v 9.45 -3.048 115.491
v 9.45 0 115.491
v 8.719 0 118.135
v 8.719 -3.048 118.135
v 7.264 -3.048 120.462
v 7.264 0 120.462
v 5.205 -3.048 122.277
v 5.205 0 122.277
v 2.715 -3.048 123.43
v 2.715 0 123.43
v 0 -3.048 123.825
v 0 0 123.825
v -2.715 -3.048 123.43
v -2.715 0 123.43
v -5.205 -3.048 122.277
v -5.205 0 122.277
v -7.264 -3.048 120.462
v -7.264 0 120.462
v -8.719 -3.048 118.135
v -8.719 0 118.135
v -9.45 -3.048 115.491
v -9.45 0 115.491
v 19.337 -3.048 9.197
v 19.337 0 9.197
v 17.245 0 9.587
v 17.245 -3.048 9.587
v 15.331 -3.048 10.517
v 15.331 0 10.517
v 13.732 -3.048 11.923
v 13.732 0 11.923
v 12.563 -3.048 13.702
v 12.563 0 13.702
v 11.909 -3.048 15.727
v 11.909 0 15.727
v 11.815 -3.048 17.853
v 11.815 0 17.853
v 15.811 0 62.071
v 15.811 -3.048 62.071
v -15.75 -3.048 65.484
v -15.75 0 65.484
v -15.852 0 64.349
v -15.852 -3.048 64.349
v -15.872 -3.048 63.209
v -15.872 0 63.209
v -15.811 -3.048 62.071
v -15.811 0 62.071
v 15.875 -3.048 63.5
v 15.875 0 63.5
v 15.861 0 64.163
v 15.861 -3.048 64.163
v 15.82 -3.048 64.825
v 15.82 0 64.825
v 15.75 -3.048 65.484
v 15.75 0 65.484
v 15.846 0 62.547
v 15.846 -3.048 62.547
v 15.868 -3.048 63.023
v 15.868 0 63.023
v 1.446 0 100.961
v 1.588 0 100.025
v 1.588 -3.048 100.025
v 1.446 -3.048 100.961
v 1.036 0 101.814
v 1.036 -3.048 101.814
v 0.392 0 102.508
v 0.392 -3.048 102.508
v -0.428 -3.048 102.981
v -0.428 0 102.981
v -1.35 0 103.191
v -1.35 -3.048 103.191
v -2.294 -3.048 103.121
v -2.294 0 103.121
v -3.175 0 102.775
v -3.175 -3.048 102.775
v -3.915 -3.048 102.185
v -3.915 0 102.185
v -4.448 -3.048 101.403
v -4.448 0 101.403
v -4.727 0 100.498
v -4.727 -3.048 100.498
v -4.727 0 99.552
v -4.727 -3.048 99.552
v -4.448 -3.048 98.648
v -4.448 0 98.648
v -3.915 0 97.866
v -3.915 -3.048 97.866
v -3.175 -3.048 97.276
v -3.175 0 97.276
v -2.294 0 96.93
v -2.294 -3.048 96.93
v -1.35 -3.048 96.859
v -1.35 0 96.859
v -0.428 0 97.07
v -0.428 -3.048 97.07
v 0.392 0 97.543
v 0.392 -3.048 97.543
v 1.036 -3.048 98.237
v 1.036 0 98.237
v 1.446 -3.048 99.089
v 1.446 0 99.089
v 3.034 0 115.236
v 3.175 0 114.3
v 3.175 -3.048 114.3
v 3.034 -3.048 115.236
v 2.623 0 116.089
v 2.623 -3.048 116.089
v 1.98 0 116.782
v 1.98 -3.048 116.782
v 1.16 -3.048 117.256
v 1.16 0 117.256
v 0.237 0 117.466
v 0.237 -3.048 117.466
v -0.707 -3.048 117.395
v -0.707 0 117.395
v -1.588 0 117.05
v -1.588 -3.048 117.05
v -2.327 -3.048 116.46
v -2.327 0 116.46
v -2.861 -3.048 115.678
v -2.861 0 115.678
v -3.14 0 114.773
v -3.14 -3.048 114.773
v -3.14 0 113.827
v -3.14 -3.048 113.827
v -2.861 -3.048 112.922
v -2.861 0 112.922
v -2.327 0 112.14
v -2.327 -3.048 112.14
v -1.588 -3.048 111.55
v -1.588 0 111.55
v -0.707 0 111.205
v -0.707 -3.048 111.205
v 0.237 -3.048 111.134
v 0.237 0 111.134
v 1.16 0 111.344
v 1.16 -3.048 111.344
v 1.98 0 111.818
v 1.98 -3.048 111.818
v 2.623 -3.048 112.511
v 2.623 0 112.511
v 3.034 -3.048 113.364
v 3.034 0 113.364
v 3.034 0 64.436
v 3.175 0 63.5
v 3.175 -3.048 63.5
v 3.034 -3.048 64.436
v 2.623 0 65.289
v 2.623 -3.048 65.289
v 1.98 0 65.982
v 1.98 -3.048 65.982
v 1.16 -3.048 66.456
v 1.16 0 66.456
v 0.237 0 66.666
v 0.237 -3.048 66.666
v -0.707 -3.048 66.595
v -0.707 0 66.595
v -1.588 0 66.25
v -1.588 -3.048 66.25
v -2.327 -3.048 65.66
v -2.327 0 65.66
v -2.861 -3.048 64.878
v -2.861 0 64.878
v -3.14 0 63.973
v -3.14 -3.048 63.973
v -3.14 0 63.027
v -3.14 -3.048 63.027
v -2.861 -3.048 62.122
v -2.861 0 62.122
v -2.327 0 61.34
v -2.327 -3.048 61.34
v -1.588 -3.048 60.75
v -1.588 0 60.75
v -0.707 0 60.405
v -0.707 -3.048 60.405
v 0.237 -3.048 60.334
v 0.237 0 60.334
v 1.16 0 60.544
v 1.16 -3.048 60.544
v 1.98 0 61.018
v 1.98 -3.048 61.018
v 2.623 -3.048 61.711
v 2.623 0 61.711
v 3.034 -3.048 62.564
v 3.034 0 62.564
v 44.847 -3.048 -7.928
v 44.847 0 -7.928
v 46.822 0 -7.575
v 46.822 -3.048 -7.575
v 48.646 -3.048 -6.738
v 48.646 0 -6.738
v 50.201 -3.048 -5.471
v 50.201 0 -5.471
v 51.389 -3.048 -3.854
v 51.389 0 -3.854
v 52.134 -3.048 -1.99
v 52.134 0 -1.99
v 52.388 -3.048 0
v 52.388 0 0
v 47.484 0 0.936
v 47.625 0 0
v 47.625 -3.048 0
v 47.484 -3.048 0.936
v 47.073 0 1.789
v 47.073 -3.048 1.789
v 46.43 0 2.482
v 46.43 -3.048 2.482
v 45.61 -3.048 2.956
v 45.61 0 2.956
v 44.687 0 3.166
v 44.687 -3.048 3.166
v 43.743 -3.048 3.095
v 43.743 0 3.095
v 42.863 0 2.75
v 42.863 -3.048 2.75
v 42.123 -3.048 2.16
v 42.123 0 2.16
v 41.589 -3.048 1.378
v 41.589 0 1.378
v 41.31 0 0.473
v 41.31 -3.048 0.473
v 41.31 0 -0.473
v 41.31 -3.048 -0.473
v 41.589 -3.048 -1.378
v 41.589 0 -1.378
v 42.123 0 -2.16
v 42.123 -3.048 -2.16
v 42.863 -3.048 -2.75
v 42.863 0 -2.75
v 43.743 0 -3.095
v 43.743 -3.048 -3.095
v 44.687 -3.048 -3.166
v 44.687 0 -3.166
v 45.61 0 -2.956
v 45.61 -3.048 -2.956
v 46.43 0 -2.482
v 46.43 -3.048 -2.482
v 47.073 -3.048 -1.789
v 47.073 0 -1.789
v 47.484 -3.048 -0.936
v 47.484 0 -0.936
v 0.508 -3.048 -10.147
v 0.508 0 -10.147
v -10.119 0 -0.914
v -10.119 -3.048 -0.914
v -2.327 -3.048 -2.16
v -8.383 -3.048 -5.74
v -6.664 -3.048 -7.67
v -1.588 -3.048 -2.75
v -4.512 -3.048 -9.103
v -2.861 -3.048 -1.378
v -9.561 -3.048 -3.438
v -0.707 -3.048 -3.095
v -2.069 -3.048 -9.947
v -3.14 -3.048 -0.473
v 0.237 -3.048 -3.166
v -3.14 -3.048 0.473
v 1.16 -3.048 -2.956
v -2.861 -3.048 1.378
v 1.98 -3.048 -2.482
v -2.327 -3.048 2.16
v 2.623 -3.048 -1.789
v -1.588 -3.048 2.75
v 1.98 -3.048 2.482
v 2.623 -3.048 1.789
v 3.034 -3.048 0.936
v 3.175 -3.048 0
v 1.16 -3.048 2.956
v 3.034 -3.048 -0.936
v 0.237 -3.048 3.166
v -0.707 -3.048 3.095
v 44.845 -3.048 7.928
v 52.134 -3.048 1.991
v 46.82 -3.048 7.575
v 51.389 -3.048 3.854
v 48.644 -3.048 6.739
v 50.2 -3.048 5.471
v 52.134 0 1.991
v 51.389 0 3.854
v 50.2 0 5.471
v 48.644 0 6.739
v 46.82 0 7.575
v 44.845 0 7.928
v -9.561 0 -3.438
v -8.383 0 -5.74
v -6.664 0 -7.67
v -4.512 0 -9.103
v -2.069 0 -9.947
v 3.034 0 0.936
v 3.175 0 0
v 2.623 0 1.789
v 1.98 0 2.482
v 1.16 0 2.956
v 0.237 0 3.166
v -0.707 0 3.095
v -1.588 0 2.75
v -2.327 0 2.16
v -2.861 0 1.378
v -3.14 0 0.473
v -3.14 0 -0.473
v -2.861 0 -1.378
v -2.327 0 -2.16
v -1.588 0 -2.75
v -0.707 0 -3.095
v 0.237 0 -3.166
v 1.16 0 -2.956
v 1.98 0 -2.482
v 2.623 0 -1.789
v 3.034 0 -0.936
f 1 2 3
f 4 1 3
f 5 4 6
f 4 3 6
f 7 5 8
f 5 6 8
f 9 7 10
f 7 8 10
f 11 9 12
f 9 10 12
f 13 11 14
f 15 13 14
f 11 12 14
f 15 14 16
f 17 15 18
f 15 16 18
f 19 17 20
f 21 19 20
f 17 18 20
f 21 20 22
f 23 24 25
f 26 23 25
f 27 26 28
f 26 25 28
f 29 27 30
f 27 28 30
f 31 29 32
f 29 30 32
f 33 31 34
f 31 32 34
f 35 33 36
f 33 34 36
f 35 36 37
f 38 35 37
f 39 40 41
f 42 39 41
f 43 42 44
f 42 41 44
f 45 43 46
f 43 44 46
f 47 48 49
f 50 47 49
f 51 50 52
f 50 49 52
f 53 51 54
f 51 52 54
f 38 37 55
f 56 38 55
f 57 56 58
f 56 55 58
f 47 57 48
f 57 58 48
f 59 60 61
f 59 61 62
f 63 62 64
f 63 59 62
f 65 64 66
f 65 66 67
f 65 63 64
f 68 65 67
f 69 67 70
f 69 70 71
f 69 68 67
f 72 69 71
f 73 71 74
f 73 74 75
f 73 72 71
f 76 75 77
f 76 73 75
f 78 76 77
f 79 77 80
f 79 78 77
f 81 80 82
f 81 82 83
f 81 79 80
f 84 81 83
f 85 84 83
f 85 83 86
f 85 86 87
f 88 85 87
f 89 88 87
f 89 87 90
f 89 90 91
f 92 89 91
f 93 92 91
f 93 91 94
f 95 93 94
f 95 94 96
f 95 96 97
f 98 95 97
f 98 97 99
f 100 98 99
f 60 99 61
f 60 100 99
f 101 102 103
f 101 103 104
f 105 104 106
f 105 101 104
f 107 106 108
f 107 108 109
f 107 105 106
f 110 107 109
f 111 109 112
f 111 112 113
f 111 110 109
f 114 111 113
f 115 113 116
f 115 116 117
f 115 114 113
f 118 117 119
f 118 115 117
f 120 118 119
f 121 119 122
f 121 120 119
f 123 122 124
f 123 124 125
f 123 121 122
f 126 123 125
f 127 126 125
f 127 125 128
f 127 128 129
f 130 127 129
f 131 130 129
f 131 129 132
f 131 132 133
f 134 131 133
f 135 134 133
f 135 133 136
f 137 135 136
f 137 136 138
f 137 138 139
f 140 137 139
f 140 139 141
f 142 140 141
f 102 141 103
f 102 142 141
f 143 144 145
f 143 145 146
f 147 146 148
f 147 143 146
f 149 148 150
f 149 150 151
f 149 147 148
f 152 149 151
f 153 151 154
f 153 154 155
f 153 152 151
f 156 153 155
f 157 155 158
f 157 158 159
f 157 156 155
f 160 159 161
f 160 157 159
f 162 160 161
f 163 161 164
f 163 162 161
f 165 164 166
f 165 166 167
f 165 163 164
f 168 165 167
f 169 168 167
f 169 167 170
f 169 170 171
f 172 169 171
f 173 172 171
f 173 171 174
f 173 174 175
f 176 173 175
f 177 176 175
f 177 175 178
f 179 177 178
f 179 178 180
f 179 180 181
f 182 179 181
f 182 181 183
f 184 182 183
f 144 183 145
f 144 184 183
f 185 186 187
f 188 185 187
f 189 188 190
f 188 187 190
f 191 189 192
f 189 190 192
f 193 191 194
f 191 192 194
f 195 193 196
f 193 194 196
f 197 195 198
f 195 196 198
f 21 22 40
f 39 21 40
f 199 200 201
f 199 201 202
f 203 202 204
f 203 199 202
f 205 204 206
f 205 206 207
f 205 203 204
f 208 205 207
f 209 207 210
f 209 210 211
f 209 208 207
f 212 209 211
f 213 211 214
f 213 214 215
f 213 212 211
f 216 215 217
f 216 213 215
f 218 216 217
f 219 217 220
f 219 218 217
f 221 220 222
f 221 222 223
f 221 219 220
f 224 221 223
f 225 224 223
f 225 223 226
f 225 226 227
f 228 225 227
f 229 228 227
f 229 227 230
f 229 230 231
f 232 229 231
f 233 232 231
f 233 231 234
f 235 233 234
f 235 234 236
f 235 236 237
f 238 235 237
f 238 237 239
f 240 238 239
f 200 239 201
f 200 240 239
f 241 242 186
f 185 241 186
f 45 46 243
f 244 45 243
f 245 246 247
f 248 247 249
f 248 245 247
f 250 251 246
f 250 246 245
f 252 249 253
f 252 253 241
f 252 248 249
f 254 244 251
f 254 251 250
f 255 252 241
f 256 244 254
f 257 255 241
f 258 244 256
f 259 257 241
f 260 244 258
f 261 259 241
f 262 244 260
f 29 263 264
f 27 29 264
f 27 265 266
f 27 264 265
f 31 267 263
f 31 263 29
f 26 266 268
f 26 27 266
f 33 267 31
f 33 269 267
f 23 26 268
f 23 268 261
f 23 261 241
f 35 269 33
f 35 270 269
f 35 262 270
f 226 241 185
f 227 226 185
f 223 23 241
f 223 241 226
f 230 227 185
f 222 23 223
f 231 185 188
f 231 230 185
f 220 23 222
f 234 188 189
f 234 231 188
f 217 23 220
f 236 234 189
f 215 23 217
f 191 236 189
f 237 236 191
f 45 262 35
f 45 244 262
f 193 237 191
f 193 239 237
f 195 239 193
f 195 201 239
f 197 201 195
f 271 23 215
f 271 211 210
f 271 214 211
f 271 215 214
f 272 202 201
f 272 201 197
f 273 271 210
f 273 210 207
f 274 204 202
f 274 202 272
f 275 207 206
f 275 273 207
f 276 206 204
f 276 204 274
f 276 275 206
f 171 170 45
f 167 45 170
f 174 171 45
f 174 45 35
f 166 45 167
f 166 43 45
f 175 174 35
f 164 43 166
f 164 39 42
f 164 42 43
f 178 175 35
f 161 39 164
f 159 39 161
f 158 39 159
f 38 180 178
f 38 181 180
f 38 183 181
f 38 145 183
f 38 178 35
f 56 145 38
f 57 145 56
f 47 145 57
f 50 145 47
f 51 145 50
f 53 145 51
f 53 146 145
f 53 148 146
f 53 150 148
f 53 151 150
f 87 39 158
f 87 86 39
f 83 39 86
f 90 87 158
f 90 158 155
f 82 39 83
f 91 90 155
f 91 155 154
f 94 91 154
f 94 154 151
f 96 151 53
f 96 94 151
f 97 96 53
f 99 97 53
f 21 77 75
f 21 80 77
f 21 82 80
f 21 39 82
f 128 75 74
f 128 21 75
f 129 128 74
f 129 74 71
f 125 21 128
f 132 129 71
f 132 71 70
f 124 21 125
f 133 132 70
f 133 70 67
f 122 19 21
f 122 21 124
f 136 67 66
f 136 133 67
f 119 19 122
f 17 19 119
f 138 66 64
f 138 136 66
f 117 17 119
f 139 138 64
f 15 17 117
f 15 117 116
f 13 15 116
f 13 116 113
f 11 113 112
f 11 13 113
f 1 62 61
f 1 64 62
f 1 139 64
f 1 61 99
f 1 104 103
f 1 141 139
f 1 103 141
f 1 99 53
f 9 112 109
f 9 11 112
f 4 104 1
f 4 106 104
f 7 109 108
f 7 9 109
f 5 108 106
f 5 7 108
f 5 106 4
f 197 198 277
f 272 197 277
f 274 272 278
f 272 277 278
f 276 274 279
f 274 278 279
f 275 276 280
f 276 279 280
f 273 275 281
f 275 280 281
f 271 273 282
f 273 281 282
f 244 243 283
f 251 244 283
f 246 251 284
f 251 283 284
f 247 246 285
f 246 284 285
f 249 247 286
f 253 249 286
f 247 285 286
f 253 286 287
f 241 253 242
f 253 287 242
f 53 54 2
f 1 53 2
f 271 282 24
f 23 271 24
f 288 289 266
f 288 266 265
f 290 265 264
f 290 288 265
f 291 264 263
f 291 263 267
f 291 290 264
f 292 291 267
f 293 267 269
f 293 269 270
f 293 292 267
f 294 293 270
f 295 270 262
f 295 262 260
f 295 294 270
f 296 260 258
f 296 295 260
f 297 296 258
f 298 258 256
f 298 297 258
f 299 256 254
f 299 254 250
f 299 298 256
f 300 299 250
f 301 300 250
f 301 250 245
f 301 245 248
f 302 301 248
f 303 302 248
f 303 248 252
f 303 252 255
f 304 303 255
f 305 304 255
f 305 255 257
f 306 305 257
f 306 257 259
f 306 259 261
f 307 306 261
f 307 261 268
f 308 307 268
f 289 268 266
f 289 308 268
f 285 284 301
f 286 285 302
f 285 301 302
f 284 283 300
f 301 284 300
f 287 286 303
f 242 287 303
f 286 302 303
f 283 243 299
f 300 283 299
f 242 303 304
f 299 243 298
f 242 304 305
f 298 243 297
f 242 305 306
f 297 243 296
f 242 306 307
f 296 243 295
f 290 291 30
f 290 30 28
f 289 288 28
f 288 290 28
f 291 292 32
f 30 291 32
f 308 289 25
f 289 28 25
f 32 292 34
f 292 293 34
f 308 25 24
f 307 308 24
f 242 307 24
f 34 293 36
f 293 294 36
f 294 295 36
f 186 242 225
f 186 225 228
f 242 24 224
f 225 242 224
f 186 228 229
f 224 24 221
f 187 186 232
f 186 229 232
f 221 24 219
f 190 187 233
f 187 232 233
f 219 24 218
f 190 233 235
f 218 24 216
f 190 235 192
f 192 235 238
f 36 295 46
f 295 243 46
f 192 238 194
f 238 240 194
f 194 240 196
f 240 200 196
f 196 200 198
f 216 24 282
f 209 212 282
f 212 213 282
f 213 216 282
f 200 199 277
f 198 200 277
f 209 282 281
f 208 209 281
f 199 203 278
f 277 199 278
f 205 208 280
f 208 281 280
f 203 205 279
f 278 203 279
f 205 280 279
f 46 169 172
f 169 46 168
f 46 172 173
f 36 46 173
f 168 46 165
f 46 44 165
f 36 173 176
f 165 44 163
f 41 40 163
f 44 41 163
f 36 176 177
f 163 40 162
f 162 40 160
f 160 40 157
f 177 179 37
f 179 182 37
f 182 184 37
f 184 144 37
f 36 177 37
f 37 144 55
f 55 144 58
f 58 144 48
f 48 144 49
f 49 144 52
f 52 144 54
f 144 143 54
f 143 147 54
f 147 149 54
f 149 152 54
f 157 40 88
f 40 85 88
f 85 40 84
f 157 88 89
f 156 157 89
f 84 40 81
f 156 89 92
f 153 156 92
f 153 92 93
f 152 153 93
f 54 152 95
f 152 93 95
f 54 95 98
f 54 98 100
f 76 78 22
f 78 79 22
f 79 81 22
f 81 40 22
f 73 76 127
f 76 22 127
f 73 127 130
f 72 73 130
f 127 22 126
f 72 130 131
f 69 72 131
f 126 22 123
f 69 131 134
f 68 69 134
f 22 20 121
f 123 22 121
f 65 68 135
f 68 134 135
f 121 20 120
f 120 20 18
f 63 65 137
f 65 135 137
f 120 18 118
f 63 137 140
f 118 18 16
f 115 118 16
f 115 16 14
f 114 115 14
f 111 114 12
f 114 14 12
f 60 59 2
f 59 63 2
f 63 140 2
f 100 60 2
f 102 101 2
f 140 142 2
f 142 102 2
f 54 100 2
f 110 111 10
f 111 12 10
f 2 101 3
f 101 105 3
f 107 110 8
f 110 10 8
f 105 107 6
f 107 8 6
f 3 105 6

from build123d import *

# Parameters (mm, degrees)
F0_R     = 3.175
F1_DEPTH = 3.048


with BuildPart() as f1:
    # F0 (on Front) → F1 (new body)
    with BuildSketch(Plane.XZ):
        with BuildLine():
            ThreePointArc((0.508, -10.147292), (7.361619, -7.002297), (10.16, 0))
            ThreePointArc((10.16, 0), (-0.457665, 10.149687), (-10.118768, -0.9144))
            ThreePointArc((-10.118768, -0.9144), (-6.663579, -7.66957), (0.508, -10.147292))
        make_face()
        Circle(F0_R, mode=Mode.SUBTRACT)
        with BuildLine():
            ThreePointArc((-10.118768, -0.9144), (-0.457665, 10.149687), (10.16, 0))
            ThreePointArc((10.16, 0), (7.361619, -7.002297), (0.508, -10.147292))
            Line((0.508, -10.147292), (44.846875, -7.927572))
            ThreePointArc((44.846875, -7.927572), (36.5125, -0.001123), (44.844631, 7.927684))
            Line((44.844631, 7.927684), (19.337417, 9.197405))
            ThreePointArc((19.337417, 9.197405), (13.731979, 11.922673), (11.814743, 17.853291))
            Line((11.814743, 17.853291), (15.810576, 62.07125))
            ThreePointArc((15.810576, 62.07125), (0, 47.625), (-15.810576, 62.07125))
            Line((-15.810576, 62.07125), (-10.118768, -0.9144))
        make_face()
        with BuildLine():
            ThreePointArc((-15.750488, 65.484375), (-15.872541, 63.779432), (-15.810576, 62.07125))
            ThreePointArc((-15.810576, 62.07125), (0, 47.625), (15.810576, 62.07125))
            ThreePointArc((15.810576, 62.07125), (15.858886, 62.784899), (15.875, 63.5))
            ThreePointArc((15.875, 63.5), (15.843841, 64.494139), (15.750488, 65.484375))
            ThreePointArc((15.750488, 65.484375), (0, 79.375), (-15.750488, 65.484375))
        make_face()
        with Locations((0, 63.5)):
            Circle(F0_R, mode=Mode.SUBTRACT)
        with BuildLine():
            ThreePointArc((44.844631, 7.927684), (36.5125, -0.001123), (44.846875, -7.927572))
            ThreePointArc((44.846875, -7.927572), (50.201265, -5.470544), (52.3875, 0))
            ThreePointArc((52.3875, 0), (50.200491, 5.471358), (44.844631, 7.927684))
        make_face()
        with Locations((44.45, 0)):
            Circle(F0_R, mode=Mode.SUBTRACT)
        with BuildLine():
            Line((-9.450293, 115.490625), (-15.750488, 65.484375))
            ThreePointArc((-15.750488, 65.484375), (0, 79.375), (15.750488, 65.484375))
            Line((15.750488, 65.484375), (9.450293, 115.490625))
            ThreePointArc((9.450293, 115.490625), (9.506305, 114.896483), (9.525, 114.3))
            ThreePointArc((9.525, 114.3), (-0.596483, 104.793695), (-9.450293, 115.490625))
        make_face()
        with Locations((-1.5875, 100.0252)):
            Circle(F0_R, mode=Mode.SUBTRACT)
        with BuildLine():
            ThreePointArc((9.450293, 115.490625), (0, 123.825), (-9.450293, 115.490625))
            ThreePointArc((-9.450293, 115.490625), (-0.596483, 104.793695), (9.525, 114.3))
            ThreePointArc((9.525, 114.3), (9.506305, 114.896483), (9.450293, 115.490625))
        make_face()
        with Locations((0, 114.3)):
            Circle(F0_R, mode=Mode.SUBTRACT)
    extrude(amount=F1_DEPTH)


solid = f1.part
